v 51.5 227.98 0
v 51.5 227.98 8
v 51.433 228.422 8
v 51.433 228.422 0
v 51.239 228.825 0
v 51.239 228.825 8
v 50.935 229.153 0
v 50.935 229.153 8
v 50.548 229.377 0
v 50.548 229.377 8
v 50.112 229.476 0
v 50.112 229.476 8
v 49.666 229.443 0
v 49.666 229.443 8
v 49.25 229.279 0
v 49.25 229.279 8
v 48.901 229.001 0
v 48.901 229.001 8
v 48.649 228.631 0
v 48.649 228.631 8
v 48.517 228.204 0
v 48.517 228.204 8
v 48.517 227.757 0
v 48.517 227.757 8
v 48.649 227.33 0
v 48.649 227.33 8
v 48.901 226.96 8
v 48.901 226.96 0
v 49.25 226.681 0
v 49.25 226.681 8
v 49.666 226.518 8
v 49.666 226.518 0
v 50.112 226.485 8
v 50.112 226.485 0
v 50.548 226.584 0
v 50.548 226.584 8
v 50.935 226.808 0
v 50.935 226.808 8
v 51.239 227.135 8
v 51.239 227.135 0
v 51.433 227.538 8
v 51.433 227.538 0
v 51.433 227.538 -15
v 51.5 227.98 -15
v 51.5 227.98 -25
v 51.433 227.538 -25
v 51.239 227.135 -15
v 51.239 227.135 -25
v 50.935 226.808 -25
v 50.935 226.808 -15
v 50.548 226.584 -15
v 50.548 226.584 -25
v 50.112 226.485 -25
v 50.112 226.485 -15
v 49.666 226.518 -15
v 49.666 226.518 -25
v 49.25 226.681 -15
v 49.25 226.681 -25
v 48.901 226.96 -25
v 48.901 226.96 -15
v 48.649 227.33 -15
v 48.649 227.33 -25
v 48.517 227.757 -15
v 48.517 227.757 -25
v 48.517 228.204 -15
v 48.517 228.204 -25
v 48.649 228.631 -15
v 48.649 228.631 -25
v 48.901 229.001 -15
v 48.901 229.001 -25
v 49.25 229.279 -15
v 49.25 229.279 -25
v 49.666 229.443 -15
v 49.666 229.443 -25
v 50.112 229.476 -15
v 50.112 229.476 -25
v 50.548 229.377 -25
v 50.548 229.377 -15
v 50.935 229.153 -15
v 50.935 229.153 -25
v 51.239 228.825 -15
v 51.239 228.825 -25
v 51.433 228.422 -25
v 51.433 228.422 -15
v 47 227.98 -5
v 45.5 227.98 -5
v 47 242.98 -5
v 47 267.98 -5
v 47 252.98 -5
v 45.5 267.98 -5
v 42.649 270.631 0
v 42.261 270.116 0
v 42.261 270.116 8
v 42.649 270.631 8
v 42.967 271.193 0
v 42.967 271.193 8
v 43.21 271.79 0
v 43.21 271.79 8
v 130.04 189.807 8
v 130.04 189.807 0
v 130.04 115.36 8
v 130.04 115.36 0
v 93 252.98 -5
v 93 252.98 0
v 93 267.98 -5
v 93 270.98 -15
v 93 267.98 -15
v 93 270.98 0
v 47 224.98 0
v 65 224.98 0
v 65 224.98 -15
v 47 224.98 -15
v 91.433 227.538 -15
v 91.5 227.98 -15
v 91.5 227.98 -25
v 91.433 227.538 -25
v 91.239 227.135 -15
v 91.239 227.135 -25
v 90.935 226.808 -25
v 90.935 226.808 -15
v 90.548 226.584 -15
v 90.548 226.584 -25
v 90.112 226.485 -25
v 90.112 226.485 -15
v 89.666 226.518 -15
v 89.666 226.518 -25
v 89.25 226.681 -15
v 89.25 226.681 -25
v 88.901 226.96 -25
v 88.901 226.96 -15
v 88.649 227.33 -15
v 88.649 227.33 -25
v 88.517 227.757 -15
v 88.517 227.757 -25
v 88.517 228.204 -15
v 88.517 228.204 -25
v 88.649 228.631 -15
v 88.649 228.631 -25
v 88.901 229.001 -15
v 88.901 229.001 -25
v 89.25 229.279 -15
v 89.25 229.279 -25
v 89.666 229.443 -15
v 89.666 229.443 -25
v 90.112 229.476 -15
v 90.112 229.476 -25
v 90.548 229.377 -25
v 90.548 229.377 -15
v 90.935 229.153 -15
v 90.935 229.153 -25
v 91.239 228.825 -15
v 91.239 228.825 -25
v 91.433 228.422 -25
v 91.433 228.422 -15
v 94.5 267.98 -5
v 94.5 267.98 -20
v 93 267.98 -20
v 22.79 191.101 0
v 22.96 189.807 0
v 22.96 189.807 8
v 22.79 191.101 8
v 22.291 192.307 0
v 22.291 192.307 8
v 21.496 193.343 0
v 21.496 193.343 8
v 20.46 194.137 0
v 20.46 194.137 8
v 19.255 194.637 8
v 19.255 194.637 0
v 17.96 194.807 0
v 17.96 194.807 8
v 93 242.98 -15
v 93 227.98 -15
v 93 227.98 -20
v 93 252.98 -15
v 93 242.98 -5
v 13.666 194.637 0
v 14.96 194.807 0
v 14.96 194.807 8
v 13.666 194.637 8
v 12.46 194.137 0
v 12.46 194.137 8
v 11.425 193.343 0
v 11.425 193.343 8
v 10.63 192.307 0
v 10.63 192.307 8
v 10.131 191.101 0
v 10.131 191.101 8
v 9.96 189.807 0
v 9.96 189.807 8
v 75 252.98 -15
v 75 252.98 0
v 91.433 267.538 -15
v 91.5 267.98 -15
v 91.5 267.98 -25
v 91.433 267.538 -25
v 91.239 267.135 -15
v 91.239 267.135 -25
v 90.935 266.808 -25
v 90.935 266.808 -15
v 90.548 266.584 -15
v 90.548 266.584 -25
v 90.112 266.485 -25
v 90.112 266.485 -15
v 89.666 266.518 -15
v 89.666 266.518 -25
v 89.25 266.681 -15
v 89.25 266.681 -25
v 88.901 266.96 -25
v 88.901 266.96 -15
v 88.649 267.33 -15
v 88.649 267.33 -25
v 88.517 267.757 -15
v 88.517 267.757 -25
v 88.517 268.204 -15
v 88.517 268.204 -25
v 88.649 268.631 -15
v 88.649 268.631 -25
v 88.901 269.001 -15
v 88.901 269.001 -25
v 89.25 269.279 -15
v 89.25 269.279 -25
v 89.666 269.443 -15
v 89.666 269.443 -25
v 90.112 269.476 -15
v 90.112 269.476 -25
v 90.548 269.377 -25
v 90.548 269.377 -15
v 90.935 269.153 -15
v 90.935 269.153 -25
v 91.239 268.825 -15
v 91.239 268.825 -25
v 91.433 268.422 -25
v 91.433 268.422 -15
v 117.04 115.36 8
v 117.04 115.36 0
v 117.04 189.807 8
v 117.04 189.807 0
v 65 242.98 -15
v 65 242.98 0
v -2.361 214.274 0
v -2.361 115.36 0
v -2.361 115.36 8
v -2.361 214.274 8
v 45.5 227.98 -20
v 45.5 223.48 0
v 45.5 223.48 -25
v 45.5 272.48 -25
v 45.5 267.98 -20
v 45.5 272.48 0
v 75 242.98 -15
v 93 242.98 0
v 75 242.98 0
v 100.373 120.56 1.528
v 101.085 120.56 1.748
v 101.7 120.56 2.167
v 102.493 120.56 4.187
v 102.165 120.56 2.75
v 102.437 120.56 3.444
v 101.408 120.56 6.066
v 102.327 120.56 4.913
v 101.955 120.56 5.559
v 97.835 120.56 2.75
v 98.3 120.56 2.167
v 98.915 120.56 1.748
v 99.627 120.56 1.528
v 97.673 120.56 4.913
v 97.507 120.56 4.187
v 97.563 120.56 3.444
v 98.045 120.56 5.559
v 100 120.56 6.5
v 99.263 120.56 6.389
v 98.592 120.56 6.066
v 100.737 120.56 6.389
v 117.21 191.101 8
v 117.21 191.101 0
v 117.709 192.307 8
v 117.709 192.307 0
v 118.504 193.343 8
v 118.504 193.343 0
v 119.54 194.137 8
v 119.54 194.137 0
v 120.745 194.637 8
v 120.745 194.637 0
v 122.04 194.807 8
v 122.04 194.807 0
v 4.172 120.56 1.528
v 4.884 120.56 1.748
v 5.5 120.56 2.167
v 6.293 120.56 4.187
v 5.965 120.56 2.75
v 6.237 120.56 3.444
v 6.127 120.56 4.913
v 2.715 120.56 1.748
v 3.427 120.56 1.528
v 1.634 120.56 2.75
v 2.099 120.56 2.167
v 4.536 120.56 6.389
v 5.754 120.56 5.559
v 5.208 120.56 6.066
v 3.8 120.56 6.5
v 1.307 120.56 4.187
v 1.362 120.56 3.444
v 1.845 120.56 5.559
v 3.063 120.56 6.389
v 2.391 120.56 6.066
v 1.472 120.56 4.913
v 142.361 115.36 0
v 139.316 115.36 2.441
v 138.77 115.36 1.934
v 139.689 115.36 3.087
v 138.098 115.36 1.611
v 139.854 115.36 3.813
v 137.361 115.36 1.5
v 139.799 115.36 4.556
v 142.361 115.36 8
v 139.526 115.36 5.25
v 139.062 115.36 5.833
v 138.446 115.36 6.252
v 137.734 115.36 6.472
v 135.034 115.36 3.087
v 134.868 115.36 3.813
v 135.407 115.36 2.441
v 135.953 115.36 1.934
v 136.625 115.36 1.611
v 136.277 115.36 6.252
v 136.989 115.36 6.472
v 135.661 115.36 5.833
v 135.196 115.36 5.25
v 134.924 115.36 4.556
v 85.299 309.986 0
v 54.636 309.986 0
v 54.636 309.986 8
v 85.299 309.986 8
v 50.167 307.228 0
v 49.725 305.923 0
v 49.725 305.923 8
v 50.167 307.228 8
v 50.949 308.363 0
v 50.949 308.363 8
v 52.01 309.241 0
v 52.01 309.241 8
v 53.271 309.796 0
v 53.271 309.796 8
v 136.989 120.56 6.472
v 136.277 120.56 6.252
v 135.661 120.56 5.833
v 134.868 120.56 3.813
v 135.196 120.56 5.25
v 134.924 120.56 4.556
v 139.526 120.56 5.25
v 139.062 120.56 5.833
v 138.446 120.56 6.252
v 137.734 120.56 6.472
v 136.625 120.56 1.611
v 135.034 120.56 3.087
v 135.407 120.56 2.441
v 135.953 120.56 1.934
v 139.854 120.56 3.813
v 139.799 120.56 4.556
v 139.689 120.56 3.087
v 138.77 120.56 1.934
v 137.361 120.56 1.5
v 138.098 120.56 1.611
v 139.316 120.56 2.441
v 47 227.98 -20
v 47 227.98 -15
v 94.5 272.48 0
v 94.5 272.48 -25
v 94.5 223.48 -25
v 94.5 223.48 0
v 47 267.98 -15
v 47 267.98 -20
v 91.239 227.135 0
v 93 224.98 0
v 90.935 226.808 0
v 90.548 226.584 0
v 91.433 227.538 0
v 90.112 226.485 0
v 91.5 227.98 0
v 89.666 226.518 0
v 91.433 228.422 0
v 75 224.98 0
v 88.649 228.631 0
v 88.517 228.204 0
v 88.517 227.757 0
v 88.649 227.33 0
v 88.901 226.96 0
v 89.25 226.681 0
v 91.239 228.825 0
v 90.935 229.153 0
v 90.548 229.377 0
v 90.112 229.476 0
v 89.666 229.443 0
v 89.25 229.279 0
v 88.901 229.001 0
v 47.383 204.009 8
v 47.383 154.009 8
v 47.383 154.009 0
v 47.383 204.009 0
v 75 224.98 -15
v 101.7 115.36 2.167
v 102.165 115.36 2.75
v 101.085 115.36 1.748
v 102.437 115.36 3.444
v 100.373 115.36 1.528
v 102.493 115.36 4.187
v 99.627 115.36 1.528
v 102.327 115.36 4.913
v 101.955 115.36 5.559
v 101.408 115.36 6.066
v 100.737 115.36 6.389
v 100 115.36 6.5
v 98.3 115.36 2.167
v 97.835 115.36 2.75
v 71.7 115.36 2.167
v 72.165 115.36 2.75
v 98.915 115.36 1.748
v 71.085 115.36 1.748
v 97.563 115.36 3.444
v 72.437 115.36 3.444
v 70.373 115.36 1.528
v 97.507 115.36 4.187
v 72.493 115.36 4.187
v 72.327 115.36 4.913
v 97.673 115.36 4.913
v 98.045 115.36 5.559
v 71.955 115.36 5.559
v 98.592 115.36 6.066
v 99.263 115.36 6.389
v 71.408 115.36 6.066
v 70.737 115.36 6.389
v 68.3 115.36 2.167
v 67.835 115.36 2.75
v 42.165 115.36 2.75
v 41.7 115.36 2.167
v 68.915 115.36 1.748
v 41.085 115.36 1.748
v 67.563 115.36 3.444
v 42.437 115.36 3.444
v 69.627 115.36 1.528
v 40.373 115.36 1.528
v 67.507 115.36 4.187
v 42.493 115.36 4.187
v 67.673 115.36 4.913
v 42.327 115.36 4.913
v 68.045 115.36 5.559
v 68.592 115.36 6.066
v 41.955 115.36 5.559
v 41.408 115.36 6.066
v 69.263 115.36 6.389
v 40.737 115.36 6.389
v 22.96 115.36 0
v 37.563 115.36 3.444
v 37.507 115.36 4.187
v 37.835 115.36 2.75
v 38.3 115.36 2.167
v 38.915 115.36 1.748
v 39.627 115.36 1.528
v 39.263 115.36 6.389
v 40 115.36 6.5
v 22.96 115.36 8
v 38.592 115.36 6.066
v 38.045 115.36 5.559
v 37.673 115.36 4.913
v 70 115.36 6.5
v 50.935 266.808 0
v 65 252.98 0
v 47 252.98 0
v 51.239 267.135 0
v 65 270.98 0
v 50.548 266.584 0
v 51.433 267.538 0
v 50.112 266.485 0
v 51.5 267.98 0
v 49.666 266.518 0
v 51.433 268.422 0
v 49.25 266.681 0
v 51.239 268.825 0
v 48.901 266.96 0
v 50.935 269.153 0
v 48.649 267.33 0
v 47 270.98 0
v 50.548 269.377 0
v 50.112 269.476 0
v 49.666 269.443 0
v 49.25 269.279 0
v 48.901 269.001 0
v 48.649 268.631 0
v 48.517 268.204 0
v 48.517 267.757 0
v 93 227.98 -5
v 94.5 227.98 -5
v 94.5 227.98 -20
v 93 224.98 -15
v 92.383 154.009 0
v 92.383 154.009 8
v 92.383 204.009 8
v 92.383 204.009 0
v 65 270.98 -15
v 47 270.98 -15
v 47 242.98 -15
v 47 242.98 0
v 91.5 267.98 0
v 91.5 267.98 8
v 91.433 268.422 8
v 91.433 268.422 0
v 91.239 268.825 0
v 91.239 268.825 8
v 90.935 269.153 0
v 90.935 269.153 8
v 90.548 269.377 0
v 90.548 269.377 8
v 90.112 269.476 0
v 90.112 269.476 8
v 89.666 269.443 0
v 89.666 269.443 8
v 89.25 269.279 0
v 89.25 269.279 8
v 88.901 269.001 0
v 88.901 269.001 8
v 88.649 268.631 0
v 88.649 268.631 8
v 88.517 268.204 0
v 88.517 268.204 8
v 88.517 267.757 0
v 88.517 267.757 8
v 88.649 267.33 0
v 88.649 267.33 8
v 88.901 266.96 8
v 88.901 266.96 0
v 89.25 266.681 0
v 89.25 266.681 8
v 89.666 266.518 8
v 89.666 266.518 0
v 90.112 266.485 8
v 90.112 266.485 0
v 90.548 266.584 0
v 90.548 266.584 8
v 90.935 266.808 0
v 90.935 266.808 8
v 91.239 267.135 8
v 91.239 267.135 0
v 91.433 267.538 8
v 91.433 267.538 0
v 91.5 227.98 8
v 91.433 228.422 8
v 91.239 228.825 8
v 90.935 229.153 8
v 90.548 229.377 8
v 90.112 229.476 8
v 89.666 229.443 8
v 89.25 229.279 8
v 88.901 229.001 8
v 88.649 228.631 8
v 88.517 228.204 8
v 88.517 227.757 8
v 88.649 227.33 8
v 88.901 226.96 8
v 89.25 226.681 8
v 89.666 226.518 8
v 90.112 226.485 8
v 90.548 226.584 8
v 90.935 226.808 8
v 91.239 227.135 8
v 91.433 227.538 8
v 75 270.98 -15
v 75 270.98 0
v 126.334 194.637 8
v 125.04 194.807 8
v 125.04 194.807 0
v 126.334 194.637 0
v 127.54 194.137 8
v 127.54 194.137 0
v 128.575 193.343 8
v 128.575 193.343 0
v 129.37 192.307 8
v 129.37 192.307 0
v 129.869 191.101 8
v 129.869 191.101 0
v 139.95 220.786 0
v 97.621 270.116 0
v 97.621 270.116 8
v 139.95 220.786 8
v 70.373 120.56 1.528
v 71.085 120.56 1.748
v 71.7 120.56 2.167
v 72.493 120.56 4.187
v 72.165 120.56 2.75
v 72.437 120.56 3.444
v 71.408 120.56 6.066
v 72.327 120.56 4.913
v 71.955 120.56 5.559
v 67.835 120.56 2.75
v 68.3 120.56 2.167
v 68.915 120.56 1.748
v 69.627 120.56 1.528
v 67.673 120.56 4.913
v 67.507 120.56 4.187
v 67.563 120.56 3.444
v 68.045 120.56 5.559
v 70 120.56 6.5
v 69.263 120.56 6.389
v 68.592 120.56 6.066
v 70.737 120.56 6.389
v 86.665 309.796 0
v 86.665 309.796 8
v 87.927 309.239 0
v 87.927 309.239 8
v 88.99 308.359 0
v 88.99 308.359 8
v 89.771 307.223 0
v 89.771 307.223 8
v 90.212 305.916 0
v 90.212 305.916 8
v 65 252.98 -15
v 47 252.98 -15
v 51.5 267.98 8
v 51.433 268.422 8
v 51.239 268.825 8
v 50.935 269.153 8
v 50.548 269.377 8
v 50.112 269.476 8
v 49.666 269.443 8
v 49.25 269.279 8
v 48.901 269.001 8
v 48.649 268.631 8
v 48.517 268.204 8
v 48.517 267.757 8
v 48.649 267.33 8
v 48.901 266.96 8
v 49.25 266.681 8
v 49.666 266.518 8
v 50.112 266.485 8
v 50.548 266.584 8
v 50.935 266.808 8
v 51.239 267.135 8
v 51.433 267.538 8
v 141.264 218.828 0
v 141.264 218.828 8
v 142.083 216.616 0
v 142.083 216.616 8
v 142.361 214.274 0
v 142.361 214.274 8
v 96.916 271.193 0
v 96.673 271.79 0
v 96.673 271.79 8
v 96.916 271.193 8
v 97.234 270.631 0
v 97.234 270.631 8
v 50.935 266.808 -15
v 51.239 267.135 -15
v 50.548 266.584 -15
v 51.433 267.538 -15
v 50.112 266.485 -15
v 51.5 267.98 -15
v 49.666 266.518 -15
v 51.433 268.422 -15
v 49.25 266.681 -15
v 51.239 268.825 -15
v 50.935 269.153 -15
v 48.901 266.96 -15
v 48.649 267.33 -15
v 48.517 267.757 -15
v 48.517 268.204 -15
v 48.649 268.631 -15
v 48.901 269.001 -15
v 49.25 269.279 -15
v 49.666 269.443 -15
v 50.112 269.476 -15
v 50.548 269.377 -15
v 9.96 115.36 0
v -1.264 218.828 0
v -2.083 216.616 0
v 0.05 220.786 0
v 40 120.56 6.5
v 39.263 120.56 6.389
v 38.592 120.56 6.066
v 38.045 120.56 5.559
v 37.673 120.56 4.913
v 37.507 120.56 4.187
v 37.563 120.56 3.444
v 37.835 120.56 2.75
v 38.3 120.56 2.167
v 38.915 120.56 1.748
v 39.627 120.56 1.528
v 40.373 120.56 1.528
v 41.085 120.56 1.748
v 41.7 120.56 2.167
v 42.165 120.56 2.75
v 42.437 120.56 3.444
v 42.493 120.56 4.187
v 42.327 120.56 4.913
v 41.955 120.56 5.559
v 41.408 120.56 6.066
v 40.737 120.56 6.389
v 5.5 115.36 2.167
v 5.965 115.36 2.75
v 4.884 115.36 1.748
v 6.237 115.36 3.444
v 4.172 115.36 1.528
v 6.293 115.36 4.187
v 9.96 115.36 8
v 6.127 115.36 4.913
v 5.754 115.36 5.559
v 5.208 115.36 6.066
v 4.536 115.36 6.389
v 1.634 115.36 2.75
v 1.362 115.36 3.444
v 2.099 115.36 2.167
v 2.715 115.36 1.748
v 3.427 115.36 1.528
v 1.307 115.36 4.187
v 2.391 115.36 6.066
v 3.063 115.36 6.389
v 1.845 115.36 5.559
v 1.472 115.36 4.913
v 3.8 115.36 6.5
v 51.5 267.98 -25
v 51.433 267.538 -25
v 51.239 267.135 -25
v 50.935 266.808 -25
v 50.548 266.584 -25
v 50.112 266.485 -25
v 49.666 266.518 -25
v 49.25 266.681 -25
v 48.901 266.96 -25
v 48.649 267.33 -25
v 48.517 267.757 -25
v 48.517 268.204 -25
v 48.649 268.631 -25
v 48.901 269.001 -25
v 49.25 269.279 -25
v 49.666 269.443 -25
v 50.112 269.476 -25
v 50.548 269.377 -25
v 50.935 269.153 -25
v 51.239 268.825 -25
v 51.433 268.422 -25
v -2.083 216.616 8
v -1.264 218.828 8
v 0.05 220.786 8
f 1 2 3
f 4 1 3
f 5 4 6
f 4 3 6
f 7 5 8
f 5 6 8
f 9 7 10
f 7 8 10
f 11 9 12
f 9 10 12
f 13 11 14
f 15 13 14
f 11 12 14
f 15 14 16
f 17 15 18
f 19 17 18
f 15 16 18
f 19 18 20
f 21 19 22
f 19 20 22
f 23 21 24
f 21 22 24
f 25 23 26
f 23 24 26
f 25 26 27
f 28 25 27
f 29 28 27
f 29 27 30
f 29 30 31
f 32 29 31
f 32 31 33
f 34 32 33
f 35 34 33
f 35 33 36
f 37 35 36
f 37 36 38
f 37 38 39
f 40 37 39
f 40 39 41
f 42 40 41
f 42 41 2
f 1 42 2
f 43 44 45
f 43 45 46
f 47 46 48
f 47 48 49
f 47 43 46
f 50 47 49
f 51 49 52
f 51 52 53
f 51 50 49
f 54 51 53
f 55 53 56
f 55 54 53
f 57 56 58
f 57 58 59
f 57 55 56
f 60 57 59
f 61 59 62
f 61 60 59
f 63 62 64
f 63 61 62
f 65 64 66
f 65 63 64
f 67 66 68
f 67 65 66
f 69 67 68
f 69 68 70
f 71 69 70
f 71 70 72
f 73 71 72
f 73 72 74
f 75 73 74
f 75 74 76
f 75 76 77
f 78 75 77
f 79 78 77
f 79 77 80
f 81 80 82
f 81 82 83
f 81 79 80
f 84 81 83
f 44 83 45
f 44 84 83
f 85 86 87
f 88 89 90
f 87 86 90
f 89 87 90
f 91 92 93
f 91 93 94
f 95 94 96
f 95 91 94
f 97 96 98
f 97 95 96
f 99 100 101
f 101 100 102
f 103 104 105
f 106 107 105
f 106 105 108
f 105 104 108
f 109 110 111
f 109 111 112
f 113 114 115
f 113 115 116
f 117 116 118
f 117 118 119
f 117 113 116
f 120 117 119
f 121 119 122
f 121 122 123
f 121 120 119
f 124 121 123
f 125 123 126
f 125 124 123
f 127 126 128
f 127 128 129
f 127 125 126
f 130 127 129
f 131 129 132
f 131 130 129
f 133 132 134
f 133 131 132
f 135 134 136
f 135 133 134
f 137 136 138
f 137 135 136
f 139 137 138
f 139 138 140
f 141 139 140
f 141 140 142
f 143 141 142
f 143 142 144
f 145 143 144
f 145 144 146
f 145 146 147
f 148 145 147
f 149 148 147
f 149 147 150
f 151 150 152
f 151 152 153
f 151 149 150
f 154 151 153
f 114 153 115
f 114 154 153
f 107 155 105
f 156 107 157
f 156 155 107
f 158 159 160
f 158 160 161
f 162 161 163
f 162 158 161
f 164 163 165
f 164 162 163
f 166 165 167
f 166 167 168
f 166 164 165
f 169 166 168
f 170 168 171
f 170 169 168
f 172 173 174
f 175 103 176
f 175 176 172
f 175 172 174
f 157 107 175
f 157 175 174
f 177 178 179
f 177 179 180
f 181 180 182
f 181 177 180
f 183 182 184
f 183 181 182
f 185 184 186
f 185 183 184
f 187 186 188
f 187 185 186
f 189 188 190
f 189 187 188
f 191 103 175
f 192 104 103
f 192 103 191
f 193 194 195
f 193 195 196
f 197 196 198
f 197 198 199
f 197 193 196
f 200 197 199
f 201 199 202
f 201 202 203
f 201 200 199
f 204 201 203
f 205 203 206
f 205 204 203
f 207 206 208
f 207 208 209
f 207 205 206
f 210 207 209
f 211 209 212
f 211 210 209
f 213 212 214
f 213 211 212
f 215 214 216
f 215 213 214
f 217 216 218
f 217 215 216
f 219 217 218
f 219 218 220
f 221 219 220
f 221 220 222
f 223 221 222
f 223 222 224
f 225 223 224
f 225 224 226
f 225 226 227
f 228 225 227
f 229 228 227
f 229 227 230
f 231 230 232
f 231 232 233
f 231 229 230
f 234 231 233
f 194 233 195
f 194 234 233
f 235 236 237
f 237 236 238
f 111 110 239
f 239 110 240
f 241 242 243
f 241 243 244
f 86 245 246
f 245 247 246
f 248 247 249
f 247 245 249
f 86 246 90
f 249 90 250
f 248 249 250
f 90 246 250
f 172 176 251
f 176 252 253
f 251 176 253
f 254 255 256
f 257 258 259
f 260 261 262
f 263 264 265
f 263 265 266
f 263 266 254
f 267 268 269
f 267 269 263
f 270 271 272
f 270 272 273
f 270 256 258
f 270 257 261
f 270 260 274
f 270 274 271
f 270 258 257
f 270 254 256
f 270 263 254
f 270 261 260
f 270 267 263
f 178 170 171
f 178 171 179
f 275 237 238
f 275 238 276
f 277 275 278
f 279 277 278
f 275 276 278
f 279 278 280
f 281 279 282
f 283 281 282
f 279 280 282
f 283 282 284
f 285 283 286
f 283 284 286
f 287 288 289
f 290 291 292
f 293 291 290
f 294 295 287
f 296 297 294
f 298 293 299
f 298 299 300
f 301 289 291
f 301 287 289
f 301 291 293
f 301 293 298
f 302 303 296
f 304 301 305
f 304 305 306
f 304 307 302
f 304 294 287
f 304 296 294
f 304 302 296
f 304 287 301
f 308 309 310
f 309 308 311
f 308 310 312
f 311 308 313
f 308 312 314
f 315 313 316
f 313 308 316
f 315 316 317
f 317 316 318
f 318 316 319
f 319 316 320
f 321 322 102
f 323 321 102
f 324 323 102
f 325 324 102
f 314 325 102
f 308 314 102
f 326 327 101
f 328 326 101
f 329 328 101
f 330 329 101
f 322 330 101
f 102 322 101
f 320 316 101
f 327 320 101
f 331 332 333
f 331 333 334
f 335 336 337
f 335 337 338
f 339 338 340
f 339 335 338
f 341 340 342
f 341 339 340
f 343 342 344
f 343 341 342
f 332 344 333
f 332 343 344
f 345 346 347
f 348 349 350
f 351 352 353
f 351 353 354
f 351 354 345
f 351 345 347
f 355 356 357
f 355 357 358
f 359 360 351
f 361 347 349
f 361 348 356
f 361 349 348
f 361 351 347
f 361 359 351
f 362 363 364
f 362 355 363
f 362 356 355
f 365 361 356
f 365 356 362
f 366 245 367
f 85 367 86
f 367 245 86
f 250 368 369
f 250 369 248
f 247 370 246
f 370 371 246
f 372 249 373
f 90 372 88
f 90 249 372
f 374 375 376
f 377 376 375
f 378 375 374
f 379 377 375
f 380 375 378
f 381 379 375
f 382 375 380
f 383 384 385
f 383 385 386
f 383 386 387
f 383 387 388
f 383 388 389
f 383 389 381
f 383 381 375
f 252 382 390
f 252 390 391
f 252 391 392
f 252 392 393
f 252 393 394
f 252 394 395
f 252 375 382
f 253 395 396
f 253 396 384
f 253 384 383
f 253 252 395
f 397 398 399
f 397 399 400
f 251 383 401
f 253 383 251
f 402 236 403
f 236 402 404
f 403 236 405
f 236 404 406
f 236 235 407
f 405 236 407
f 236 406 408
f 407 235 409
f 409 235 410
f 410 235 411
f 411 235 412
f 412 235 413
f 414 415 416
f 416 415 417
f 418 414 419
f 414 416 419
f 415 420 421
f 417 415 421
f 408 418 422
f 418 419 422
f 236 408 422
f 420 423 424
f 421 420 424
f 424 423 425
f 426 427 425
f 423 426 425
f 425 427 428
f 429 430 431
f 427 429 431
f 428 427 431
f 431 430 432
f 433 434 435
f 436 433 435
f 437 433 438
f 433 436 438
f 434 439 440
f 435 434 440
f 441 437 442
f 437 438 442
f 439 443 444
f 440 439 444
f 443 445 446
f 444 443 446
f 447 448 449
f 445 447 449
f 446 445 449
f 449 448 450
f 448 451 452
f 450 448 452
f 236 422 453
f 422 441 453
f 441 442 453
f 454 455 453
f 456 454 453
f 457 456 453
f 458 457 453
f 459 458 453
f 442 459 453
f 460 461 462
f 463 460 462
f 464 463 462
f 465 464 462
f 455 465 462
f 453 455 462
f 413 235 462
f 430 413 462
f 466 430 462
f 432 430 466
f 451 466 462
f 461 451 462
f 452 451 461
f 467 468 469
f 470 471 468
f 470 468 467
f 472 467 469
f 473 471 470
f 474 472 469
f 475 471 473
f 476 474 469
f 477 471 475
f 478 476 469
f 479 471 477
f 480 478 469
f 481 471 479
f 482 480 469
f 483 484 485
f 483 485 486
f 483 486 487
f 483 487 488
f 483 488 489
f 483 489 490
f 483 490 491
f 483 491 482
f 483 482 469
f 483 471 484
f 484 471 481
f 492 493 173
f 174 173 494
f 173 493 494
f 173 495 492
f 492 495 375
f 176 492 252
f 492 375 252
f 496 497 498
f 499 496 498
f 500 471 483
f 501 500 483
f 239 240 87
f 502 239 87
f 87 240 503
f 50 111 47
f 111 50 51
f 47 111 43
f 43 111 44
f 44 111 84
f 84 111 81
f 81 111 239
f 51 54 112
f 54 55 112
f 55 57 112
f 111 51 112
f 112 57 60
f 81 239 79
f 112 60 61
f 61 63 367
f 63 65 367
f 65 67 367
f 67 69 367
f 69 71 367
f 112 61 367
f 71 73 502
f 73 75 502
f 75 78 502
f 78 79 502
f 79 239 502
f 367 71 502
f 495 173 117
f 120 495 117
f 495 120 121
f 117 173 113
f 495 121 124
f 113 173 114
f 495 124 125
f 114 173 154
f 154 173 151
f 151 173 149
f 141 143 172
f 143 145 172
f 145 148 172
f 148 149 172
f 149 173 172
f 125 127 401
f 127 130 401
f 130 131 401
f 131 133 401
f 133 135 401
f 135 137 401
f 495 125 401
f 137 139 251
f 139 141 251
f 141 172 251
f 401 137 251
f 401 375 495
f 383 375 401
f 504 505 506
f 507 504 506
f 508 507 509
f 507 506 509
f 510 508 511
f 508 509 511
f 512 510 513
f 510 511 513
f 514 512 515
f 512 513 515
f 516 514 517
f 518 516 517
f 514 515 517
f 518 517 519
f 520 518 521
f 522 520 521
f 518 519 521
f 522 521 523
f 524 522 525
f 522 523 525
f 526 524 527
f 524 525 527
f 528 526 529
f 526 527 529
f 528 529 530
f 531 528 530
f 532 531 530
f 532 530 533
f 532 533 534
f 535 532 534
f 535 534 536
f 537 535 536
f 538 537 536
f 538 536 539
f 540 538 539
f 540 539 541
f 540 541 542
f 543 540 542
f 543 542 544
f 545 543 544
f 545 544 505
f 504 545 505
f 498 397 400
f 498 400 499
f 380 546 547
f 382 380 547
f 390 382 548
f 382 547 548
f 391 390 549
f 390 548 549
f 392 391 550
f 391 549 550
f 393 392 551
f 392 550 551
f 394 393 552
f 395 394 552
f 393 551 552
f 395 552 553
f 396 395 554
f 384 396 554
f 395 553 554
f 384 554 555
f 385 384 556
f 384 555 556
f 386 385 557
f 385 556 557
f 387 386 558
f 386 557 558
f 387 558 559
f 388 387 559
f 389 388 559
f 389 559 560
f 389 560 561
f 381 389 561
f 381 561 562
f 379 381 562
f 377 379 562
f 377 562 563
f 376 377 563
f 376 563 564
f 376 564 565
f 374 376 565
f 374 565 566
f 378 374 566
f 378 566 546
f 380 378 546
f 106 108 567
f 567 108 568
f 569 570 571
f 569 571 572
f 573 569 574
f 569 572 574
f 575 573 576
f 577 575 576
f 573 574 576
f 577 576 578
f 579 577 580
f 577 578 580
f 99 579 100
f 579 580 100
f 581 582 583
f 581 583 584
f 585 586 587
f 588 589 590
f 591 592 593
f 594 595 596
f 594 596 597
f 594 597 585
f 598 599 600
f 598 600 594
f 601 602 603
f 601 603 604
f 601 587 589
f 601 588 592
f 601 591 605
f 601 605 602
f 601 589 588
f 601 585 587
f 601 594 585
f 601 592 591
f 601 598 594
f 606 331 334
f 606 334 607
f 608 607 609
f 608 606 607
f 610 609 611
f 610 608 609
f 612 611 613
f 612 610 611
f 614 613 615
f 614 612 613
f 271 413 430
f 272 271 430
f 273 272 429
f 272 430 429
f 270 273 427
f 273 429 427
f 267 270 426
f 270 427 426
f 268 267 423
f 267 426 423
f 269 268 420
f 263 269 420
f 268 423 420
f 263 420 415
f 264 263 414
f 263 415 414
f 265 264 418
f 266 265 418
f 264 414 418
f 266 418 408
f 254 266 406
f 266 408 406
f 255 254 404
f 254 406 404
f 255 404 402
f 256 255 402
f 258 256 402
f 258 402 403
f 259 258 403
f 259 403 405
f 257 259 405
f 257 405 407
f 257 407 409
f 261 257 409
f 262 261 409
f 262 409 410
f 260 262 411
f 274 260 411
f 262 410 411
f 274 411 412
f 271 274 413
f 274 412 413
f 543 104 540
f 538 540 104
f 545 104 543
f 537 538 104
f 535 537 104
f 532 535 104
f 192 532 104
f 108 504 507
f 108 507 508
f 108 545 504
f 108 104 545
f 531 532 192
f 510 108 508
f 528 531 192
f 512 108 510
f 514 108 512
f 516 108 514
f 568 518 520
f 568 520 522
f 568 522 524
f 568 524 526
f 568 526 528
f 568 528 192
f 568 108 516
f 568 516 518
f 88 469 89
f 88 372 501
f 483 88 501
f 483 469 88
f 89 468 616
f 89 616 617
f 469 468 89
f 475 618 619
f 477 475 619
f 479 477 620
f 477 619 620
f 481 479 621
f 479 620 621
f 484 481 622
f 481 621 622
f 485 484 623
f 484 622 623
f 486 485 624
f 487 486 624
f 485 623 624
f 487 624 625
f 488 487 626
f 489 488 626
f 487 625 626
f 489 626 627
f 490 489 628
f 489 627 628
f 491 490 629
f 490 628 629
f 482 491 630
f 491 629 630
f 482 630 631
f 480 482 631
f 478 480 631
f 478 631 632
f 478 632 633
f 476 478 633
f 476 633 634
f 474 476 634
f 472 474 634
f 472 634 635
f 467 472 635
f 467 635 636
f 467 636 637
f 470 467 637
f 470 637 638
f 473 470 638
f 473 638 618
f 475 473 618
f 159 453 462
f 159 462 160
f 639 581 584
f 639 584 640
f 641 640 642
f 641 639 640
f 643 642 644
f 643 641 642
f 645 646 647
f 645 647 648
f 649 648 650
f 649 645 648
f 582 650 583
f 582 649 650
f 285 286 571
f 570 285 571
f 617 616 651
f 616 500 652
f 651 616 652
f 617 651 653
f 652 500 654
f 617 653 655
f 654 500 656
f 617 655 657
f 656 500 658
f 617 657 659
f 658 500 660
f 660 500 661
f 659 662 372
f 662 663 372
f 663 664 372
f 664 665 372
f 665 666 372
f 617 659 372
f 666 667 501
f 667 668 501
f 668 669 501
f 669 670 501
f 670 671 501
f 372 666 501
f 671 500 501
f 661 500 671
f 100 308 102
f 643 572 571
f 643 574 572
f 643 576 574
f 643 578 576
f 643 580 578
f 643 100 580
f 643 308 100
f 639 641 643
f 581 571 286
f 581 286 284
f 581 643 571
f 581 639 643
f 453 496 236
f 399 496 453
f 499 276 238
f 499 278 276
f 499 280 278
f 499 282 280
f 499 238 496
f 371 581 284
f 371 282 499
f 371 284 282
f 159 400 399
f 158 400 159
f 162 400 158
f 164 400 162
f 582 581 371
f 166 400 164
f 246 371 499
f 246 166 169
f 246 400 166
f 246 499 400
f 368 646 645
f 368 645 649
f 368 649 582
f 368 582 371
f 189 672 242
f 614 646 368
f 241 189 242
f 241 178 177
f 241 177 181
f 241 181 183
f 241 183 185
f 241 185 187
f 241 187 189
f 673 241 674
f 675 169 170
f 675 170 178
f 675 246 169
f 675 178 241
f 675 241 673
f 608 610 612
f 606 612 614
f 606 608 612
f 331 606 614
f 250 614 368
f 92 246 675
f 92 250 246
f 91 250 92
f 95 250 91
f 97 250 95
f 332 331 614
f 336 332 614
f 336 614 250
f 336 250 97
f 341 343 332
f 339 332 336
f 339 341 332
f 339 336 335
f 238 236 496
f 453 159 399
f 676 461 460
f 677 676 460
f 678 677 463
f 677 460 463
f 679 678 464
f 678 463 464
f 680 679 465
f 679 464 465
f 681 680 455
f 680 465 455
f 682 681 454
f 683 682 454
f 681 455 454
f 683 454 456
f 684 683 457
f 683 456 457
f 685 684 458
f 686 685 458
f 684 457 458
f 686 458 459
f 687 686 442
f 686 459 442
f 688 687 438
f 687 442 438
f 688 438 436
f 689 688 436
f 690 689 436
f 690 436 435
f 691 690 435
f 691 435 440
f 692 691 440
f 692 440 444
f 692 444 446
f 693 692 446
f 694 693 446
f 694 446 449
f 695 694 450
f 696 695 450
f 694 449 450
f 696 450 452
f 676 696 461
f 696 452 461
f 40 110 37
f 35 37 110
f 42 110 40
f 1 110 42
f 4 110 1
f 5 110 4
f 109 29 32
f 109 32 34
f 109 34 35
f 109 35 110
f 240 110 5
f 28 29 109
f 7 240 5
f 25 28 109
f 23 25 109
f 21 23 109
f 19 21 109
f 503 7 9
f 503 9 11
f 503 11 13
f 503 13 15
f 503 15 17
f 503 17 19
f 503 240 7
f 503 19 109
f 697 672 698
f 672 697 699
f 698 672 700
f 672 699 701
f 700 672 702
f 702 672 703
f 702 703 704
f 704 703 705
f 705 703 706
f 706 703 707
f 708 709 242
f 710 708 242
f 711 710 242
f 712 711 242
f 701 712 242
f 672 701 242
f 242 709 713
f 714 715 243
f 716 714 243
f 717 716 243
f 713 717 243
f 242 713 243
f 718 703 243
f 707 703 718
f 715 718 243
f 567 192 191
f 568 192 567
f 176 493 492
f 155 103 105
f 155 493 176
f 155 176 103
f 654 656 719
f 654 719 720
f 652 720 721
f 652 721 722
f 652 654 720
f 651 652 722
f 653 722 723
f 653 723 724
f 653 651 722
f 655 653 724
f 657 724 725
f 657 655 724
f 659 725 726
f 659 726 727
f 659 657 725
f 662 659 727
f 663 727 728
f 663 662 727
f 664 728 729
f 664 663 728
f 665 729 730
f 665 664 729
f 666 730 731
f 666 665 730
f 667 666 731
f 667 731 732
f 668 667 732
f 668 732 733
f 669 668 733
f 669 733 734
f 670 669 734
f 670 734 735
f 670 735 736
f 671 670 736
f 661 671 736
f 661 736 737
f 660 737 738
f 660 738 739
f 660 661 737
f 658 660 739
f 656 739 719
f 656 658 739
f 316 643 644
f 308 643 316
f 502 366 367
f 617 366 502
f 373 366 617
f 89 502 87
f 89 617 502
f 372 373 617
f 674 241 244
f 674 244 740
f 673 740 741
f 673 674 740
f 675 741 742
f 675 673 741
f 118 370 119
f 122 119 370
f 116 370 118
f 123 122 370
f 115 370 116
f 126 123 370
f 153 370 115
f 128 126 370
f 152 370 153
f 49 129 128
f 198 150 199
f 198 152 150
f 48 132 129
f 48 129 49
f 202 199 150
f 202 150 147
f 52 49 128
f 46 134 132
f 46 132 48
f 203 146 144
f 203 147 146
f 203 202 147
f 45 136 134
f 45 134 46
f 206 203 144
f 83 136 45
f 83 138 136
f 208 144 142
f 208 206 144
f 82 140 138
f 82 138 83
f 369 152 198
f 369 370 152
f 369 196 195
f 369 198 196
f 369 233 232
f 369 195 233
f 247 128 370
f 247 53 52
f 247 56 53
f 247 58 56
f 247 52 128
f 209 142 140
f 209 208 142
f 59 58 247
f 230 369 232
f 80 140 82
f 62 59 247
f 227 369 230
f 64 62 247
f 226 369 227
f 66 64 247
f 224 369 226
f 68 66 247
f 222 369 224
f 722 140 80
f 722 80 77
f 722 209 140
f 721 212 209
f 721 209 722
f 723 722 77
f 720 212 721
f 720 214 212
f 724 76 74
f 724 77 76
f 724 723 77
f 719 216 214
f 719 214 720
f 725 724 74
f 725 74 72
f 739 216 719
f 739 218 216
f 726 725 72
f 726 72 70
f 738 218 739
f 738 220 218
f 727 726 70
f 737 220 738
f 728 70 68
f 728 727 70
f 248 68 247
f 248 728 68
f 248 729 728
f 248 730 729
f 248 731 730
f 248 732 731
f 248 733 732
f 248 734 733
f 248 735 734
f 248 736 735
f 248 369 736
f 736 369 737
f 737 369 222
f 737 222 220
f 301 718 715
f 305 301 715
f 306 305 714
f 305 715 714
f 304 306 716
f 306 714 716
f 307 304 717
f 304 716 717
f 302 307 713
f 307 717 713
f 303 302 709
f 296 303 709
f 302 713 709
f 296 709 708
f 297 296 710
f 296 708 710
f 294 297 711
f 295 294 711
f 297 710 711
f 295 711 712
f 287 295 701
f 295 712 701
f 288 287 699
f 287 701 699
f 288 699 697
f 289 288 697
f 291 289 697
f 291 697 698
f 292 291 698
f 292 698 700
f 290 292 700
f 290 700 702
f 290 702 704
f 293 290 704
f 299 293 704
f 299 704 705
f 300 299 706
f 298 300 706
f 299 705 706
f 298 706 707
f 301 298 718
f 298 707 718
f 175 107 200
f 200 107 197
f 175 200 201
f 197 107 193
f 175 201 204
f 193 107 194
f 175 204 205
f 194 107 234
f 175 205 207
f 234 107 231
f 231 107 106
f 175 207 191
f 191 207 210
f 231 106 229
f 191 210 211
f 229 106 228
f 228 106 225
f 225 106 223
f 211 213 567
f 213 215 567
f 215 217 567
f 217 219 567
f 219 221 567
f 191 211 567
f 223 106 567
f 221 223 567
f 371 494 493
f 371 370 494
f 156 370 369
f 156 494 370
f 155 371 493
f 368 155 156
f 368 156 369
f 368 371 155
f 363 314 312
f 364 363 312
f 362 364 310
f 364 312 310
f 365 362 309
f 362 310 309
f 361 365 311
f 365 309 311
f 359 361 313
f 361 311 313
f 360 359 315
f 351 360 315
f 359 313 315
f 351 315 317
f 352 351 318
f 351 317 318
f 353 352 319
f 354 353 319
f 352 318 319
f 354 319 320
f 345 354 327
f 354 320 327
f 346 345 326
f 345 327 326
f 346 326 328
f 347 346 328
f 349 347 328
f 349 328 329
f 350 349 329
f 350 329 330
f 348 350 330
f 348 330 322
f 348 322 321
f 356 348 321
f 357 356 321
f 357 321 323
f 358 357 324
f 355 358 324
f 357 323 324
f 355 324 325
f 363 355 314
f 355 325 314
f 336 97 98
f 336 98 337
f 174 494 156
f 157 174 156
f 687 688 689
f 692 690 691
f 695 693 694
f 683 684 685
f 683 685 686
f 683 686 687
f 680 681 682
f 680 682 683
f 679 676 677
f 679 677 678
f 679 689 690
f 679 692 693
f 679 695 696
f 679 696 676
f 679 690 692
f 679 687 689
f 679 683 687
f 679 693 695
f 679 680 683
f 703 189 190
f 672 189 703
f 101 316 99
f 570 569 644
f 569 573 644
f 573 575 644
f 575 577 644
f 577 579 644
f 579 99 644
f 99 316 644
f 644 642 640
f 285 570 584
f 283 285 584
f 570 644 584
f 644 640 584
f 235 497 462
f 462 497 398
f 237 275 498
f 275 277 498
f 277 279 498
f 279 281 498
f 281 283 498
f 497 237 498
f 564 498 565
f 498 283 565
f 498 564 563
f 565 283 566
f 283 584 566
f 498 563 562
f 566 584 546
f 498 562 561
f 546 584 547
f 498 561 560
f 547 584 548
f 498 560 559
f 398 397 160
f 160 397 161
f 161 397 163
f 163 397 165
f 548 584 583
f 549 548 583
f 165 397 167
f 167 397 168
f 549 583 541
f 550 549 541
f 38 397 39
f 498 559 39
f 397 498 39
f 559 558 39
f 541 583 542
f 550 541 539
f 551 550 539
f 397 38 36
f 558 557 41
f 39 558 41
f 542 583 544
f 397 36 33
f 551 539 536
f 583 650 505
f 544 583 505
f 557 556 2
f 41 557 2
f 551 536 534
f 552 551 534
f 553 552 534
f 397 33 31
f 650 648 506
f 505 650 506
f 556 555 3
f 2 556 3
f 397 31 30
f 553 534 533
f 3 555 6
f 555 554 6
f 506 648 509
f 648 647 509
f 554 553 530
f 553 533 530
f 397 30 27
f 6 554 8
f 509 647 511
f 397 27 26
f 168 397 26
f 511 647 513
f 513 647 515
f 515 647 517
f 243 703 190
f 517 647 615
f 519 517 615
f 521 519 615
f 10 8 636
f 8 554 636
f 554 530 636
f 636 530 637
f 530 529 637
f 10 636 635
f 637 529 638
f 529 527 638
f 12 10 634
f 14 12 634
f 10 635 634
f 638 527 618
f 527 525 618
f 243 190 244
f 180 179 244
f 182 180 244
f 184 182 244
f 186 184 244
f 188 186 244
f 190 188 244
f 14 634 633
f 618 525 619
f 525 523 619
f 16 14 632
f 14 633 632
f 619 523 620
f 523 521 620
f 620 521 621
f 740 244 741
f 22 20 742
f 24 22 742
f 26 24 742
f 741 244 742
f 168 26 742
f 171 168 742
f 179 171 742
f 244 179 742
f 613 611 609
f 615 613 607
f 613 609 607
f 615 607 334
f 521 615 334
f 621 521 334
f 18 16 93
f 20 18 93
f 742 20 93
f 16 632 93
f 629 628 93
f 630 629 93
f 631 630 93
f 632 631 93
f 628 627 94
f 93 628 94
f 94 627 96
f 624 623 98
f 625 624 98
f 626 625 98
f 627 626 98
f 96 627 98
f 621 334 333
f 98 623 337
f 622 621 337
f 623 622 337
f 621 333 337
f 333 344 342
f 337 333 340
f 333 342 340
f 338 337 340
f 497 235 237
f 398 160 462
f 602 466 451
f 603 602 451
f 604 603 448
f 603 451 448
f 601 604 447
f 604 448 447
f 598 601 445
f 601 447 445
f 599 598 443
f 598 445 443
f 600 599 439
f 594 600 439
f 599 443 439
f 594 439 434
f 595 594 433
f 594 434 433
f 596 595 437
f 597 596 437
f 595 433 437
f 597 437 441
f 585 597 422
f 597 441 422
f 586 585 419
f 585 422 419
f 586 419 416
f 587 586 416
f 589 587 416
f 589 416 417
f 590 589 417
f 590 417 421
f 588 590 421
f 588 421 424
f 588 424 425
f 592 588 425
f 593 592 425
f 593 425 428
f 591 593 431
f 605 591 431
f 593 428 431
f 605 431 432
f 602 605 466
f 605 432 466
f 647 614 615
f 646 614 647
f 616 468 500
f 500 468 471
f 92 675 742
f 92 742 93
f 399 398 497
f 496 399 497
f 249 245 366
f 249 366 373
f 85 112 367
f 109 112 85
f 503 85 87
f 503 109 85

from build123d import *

# Parameters (mm, degrees)
BOSS_EXTRUDE1_DEPTH    = 8
SKETCH2_W              = 45
SKETCH2_H              = 50
CUT_EXTRUDE1_DEPTH     = 342.206659287
SPLIT1_SURFACE_1_BACK  = 343.199
SPLIT1_SURFACE_1_DEPTH = 686.398
SPLIT1_SURFACE_2_BACK  = 343.199
SPLIT1_SURFACE_2_DEPTH = 686.398
SKETCH5_R              = 2.5
CUT_EXTRUDE6_DEPTH     = 5.2
SKETCH4_R              = 2.5
CUT_EXTRUDE7_DEPTH     = 5.2
SKETCH6_R              = 1.5
CUT_EXTRUDE8_DEPTH     = 342.206659287
SKETCH7_W              = 49
SKETCH7_H              = 49
SKETCH7_W_2            = 18
SKETCH7_H_2            = 18
BOSS_EXTRUDE2_DEPTH    = 15
SKETCH8_W              = 49
SKETCH8_H              = 49
SKETCH8_R              = 1.5
BOSS_EXTRUDE3_DEPTH    = 10
SKETCH9_W              = 15
SKETCH9_H              = 40
CUT_EXTRUDE9_DEPTH     = 1.5
SKETCH11_W             = 15
SKETCH11_H             = 40
CUT_EXTRUDE10_DEPTH    = 1.5


with BuildPart() as part:
    # Sketch1 → Boss-Extrude1 (new body)
    with BuildSketch(Plane.XY):
        with BuildLine():
            Line((70, 309.985818768), (85.299227191, 309.985818768))
            ThreePointArc((85.299227191, 309.985818768), (88.489017574, 308.836174247), (90.211957942, 305.915913694))
            Line((90.211957942, 305.915913694), (96.672728921, 271.790334282))
            ThreePointArc((96.672728921, 271.790334282), (97.06575438, 270.906904614), (97.621470019, 270.115641625))
            Line((97.621470019, 270.115641625), (139.950460317, 220.786053348))
            ThreePointArc((139.950460317, 220.786053348), (141.739336996, 217.746026552), (142.361429131, 214.274017901))
            Line((142.361429131, 214.274017901), (142.361429131, 30.859943174))
            ThreePointArc((142.361429131, 30.859943174), (140.896963037, 27.324409268), (137.361429131, 25.859943174))
            Line((137.361429131, 25.859943174), (114.717190871, 25.782318449))
            ThreePointArc((114.717190871, 25.782318449), (112.681998989, 25.341726514), (111.002773989, 24.110332733))
            Line((111.002773989, 24.110332733), (89.38285929, 0))
            Line((89.38285929, 0), (50.5, 0))
            Line((50.5, 0), (28.997226011, 24.110332733))
            ThreePointArc((28.997226011, 24.110332733), (27.318001011, 25.341726514), (25.282809129, 25.782318449))
            Line((25.282809129, 25.782318449), (2.638570869, 25.859943174))
            ThreePointArc((2.638570869, 25.859943174), (-0.896963037, 27.324409268), (-2.361429131, 30.859943174))
            Line((-2.361429131, 30.859943174), (-2.361429131, 214.274017901))
            ThreePointArc((-2.361429131, 214.274017901), (-1.739336996, 217.746026552), (0.049539683, 220.786053348))
            Line((0.049539683, 220.786053348), (42.261389271, 270.115641625))
            ThreePointArc((42.261389271, 270.115641625), (42.81710491, 270.906904614), (43.210130369, 271.790334282))
            Line((43.210130369, 271.790334282), (49.724618218, 305.923183314))
            ThreePointArc((49.724618218, 305.923183314), (51.449026762, 308.838533573), (54.635967087, 309.985818768))
            Line((54.635967087, 309.985818768), (70, 309.985818768))
        make_face()
        with BuildLine():
            Line((15.218798766, 54.807228462), (17.702103505, 54.807228462))
            ThreePointArc((17.702103505, 54.807228462), (21.420312934, 56.347361236), (22.960445707, 60.065570665))
            Line((22.960445707, 60.065570665), (22.960445707, 189.807228462))
            ThreePointArc((22.960445707, 189.807228462), (21.495979613, 193.342762368), (17.960445707, 194.807228462))
            Line((17.960445707, 194.807228462), (14.960456564, 194.807228462))
            ThreePointArc((14.960456564, 194.807228462), (11.424922658, 193.342762368), (9.960456564, 189.807228462))
            Line((9.960456564, 189.807228462), (9.960456564, 60.065570665))
            ThreePointArc((9.960456564, 60.065570665), (11.500589337, 56.347361236), (15.218798766, 54.807228462))
        make_face(mode=Mode.SUBTRACT)
        with BuildLine():
            Line((125.039543436, 54.807228462), (122.039554293, 54.807228462))
            ThreePointArc((122.039554293, 54.807228462), (118.504020387, 56.271694556), (117.039554293, 59.807228462))
            Line((117.039554293, 59.807228462), (117.039554293, 189.807228462))
            ThreePointArc((117.039554293, 189.807228462), (118.504020387, 193.342762368), (122.039554293, 194.807228462))
            Line((122.039554293, 194.807228462), (125.039543436, 194.807228462))
            ThreePointArc((125.039543436, 194.807228462), (128.575077342, 193.342762368), (130.039543436, 189.807228462))
            Line((130.039543436, 189.807228462), (130.039543436, 59.807228462))
            ThreePointArc((130.039543436, 59.807228462), (128.575077342, 56.271694556), (125.039543436, 54.807228462))
        make_face(mode=Mode.SUBTRACT)
    extrude(amount=BOSS_EXTRUDE1_DEPTH)

    # Sketch2 → Cut-Extrude1 (cut, through all)
    with BuildSketch(Plane.XY.offset(8)):
        with Locations((69.88285929, 179.008918923)):
            Rectangle(SKETCH2_W, SKETCH2_H)
    extrude(amount=-CUT_EXTRUDE1_DEPTH, mode=Mode.SUBTRACT)


with BuildPart() as body_2:
    # Split1: the piece behind the surface
    add(part.part)
    # Split1 surface: a surface, the sketch's curves swept straight by 686.398 mm
    with BuildLine(Plane(origin=(0, 0, 0), x_dir=(-1, 0, 0), z_dir=(0, 0, -1)).offset(-SPLIT1_SURFACE_1_BACK), mode=Mode.PRIVATE) as split1_surface_1_path:
        Line((-142.361429131, 115.359943174), (2.361429131, 115.359943174))
    split1_surface_1 = Shell.extrude(split1_surface_1_path.wire(), (0 * SPLIT1_SURFACE_1_DEPTH, 0 * SPLIT1_SURFACE_1_DEPTH, -1 * SPLIT1_SURFACE_1_DEPTH))
    split(bisect_by=split1_surface_1, keep=Keep.BOTTOM)

    # Sketch5 → Cut-Extrude6 (cut)
    with BuildSketch(Plane(origin=(0, 115.359943174, -115.359943174), x_dir=(1, 0, 0), z_dir=(0, -1, 0))):
        with Locations(Location((70, 119.359943174, 0), (0, 0, 270))):
            Circle(SKETCH5_R)
        with Locations(Location((40, 119.359943174, 0), (0, 0, 270))):
            Circle(SKETCH5_R)
        with Locations(Location((2.638570869, 119.359943174, 0), (0, 0, 270))):
            Circle(SKETCH5_R)
    extrude(amount=CUT_EXTRUDE6_DEPTH, mode=Mode.SUBTRACT)


with BuildPart() as part_1:
    add(part.part)

    # Split1: split by a surface, the side it looks to stays
    # Split1 surface: a surface, the sketch's curves swept straight by 686.398 mm
    with BuildLine(Plane(origin=(0, 0, 0), x_dir=(-1, 0, 0), z_dir=(0, 0, -1)).offset(-SPLIT1_SURFACE_2_BACK), mode=Mode.PRIVATE) as split1_surface_2_path:
        Line((-142.361429131, 115.359943174), (2.361429131, 115.359943174))
    split1_surface_2 = Shell.extrude(split1_surface_2_path.wire(), (0 * SPLIT1_SURFACE_2_DEPTH, 0 * SPLIT1_SURFACE_2_DEPTH, -1 * SPLIT1_SURFACE_2_DEPTH))
    split(bisect_by=split1_surface_2, keep=Keep.TOP)

    # Sketch4 → Cut-Extrude7 (cut)
    with BuildSketch(Plane(origin=(0, 115.359943174, 0), x_dir=(-1, 0, 0), z_dir=(0, -1, 0))):
        with Locations(Location((-70, -4, 0), (0, 0, 270))):
            Circle(SKETCH4_R)
        with Locations(Location((-40, -4, 0), (0, 0, 270))):
            Circle(SKETCH4_R)
        with Locations(Location((-100, -4, 0), (0, 0, 270))):
            Circle(SKETCH4_R)
        with Locations(Location((-137.361429131, -4, 0), (0, 0, 90))):
            Circle(SKETCH4_R)
        with Locations(Location((-3.799513716, -4, 0), (0, 0, 270))):
            Circle(SKETCH4_R)
    extrude(amount=-CUT_EXTRUDE7_DEPTH, mode=Mode.SUBTRACT)

    # Sketch6 → Cut-Extrude8 (cut, through all)
    with BuildSketch(Plane.XY.offset(8)):
        with Locations((50.000130369, 267.980334282)):
            Circle(SKETCH6_R)
        with Locations((90.000130369, 267.980334282)):
            Circle(SKETCH6_R)
        with Locations((90.000130369, 227.980334282)):
            Circle(SKETCH6_R)
        with Locations((50.000130369, 227.980334282)):
            Circle(SKETCH6_R)
    extrude(amount=-CUT_EXTRUDE8_DEPTH, mode=Mode.SUBTRACT)

    # Sketch7 → Boss-Extrude2 (add)
    with BuildSketch(Plane(origin=(0, 0, 0), x_dir=(-1, 0, 0), z_dir=(0, 0, -1))):
        with Locations((-70.000130369, 247.980334282)):
            Rectangle(SKETCH7_W, SKETCH7_H)
        with Locations((-56.000130369, 261.980334282)):
            Rectangle(SKETCH7_W_2, SKETCH7_H_2, mode=Mode.SUBTRACT)
        with Locations((-84.000130369, 261.980334282)):
            Rectangle(SKETCH7_W_2, SKETCH7_H_2, mode=Mode.SUBTRACT)
        with Locations((-84.000130369, 233.980334282)):
            Rectangle(SKETCH7_W_2, SKETCH7_H_2, mode=Mode.SUBTRACT)
        with Locations((-56.000130369, 233.980334282)):
            Rectangle(SKETCH7_W_2, SKETCH7_H_2, mode=Mode.SUBTRACT)
    extrude(amount=BOSS_EXTRUDE2_DEPTH)

    # Sketch8 → Boss-Extrude3 (add)
    with BuildSketch(Plane(origin=(0, 0, -15), x_dir=(-1, 0, 0), z_dir=(0, 0, -1))):
        with Locations((-70.000130369, 247.980334282)):
            Rectangle(SKETCH8_W, SKETCH8_H)
        with Locations(Location((-50.000130369, 267.980334282, 0), (0, 0, 180))):
            Circle(SKETCH8_R, mode=Mode.SUBTRACT)
        with Locations(Location((-90.000130369, 267.980334282, 0), (0, 0, 180))):
            Circle(SKETCH8_R, mode=Mode.SUBTRACT)
        with Locations(Location((-50.000130369, 227.980334282, 0), (0, 0, 180))):
            Circle(SKETCH8_R, mode=Mode.SUBTRACT)
        with Locations(Location((-90.000130369, 227.980334282, 0), (0, 0, 180))):
            Circle(SKETCH8_R, mode=Mode.SUBTRACT)
    extrude(amount=BOSS_EXTRUDE3_DEPTH)

    # Sketch9 → Cut-Extrude9 (cut)
    with BuildSketch(Plane.ZY.offset(-45.500130369)):
        with Locations((-12.5, 247.980334282)):
            Rectangle(SKETCH9_W, SKETCH9_H)
    extrude(amount=-CUT_EXTRUDE9_DEPTH, mode=Mode.SUBTRACT)

    # Sketch11 → Cut-Extrude10 (cut)
    with BuildSketch(Plane(origin=(94.500130369, 0, 0), x_dir=(0, 0, -1), z_dir=(1, 0, 0))):
        with Locations((12.5, 247.980334282)):
            Rectangle(SKETCH11_W, SKETCH11_H)
    extrude(amount=-CUT_EXTRUDE10_DEPTH, mode=Mode.SUBTRACT)


solid = part_1.part
